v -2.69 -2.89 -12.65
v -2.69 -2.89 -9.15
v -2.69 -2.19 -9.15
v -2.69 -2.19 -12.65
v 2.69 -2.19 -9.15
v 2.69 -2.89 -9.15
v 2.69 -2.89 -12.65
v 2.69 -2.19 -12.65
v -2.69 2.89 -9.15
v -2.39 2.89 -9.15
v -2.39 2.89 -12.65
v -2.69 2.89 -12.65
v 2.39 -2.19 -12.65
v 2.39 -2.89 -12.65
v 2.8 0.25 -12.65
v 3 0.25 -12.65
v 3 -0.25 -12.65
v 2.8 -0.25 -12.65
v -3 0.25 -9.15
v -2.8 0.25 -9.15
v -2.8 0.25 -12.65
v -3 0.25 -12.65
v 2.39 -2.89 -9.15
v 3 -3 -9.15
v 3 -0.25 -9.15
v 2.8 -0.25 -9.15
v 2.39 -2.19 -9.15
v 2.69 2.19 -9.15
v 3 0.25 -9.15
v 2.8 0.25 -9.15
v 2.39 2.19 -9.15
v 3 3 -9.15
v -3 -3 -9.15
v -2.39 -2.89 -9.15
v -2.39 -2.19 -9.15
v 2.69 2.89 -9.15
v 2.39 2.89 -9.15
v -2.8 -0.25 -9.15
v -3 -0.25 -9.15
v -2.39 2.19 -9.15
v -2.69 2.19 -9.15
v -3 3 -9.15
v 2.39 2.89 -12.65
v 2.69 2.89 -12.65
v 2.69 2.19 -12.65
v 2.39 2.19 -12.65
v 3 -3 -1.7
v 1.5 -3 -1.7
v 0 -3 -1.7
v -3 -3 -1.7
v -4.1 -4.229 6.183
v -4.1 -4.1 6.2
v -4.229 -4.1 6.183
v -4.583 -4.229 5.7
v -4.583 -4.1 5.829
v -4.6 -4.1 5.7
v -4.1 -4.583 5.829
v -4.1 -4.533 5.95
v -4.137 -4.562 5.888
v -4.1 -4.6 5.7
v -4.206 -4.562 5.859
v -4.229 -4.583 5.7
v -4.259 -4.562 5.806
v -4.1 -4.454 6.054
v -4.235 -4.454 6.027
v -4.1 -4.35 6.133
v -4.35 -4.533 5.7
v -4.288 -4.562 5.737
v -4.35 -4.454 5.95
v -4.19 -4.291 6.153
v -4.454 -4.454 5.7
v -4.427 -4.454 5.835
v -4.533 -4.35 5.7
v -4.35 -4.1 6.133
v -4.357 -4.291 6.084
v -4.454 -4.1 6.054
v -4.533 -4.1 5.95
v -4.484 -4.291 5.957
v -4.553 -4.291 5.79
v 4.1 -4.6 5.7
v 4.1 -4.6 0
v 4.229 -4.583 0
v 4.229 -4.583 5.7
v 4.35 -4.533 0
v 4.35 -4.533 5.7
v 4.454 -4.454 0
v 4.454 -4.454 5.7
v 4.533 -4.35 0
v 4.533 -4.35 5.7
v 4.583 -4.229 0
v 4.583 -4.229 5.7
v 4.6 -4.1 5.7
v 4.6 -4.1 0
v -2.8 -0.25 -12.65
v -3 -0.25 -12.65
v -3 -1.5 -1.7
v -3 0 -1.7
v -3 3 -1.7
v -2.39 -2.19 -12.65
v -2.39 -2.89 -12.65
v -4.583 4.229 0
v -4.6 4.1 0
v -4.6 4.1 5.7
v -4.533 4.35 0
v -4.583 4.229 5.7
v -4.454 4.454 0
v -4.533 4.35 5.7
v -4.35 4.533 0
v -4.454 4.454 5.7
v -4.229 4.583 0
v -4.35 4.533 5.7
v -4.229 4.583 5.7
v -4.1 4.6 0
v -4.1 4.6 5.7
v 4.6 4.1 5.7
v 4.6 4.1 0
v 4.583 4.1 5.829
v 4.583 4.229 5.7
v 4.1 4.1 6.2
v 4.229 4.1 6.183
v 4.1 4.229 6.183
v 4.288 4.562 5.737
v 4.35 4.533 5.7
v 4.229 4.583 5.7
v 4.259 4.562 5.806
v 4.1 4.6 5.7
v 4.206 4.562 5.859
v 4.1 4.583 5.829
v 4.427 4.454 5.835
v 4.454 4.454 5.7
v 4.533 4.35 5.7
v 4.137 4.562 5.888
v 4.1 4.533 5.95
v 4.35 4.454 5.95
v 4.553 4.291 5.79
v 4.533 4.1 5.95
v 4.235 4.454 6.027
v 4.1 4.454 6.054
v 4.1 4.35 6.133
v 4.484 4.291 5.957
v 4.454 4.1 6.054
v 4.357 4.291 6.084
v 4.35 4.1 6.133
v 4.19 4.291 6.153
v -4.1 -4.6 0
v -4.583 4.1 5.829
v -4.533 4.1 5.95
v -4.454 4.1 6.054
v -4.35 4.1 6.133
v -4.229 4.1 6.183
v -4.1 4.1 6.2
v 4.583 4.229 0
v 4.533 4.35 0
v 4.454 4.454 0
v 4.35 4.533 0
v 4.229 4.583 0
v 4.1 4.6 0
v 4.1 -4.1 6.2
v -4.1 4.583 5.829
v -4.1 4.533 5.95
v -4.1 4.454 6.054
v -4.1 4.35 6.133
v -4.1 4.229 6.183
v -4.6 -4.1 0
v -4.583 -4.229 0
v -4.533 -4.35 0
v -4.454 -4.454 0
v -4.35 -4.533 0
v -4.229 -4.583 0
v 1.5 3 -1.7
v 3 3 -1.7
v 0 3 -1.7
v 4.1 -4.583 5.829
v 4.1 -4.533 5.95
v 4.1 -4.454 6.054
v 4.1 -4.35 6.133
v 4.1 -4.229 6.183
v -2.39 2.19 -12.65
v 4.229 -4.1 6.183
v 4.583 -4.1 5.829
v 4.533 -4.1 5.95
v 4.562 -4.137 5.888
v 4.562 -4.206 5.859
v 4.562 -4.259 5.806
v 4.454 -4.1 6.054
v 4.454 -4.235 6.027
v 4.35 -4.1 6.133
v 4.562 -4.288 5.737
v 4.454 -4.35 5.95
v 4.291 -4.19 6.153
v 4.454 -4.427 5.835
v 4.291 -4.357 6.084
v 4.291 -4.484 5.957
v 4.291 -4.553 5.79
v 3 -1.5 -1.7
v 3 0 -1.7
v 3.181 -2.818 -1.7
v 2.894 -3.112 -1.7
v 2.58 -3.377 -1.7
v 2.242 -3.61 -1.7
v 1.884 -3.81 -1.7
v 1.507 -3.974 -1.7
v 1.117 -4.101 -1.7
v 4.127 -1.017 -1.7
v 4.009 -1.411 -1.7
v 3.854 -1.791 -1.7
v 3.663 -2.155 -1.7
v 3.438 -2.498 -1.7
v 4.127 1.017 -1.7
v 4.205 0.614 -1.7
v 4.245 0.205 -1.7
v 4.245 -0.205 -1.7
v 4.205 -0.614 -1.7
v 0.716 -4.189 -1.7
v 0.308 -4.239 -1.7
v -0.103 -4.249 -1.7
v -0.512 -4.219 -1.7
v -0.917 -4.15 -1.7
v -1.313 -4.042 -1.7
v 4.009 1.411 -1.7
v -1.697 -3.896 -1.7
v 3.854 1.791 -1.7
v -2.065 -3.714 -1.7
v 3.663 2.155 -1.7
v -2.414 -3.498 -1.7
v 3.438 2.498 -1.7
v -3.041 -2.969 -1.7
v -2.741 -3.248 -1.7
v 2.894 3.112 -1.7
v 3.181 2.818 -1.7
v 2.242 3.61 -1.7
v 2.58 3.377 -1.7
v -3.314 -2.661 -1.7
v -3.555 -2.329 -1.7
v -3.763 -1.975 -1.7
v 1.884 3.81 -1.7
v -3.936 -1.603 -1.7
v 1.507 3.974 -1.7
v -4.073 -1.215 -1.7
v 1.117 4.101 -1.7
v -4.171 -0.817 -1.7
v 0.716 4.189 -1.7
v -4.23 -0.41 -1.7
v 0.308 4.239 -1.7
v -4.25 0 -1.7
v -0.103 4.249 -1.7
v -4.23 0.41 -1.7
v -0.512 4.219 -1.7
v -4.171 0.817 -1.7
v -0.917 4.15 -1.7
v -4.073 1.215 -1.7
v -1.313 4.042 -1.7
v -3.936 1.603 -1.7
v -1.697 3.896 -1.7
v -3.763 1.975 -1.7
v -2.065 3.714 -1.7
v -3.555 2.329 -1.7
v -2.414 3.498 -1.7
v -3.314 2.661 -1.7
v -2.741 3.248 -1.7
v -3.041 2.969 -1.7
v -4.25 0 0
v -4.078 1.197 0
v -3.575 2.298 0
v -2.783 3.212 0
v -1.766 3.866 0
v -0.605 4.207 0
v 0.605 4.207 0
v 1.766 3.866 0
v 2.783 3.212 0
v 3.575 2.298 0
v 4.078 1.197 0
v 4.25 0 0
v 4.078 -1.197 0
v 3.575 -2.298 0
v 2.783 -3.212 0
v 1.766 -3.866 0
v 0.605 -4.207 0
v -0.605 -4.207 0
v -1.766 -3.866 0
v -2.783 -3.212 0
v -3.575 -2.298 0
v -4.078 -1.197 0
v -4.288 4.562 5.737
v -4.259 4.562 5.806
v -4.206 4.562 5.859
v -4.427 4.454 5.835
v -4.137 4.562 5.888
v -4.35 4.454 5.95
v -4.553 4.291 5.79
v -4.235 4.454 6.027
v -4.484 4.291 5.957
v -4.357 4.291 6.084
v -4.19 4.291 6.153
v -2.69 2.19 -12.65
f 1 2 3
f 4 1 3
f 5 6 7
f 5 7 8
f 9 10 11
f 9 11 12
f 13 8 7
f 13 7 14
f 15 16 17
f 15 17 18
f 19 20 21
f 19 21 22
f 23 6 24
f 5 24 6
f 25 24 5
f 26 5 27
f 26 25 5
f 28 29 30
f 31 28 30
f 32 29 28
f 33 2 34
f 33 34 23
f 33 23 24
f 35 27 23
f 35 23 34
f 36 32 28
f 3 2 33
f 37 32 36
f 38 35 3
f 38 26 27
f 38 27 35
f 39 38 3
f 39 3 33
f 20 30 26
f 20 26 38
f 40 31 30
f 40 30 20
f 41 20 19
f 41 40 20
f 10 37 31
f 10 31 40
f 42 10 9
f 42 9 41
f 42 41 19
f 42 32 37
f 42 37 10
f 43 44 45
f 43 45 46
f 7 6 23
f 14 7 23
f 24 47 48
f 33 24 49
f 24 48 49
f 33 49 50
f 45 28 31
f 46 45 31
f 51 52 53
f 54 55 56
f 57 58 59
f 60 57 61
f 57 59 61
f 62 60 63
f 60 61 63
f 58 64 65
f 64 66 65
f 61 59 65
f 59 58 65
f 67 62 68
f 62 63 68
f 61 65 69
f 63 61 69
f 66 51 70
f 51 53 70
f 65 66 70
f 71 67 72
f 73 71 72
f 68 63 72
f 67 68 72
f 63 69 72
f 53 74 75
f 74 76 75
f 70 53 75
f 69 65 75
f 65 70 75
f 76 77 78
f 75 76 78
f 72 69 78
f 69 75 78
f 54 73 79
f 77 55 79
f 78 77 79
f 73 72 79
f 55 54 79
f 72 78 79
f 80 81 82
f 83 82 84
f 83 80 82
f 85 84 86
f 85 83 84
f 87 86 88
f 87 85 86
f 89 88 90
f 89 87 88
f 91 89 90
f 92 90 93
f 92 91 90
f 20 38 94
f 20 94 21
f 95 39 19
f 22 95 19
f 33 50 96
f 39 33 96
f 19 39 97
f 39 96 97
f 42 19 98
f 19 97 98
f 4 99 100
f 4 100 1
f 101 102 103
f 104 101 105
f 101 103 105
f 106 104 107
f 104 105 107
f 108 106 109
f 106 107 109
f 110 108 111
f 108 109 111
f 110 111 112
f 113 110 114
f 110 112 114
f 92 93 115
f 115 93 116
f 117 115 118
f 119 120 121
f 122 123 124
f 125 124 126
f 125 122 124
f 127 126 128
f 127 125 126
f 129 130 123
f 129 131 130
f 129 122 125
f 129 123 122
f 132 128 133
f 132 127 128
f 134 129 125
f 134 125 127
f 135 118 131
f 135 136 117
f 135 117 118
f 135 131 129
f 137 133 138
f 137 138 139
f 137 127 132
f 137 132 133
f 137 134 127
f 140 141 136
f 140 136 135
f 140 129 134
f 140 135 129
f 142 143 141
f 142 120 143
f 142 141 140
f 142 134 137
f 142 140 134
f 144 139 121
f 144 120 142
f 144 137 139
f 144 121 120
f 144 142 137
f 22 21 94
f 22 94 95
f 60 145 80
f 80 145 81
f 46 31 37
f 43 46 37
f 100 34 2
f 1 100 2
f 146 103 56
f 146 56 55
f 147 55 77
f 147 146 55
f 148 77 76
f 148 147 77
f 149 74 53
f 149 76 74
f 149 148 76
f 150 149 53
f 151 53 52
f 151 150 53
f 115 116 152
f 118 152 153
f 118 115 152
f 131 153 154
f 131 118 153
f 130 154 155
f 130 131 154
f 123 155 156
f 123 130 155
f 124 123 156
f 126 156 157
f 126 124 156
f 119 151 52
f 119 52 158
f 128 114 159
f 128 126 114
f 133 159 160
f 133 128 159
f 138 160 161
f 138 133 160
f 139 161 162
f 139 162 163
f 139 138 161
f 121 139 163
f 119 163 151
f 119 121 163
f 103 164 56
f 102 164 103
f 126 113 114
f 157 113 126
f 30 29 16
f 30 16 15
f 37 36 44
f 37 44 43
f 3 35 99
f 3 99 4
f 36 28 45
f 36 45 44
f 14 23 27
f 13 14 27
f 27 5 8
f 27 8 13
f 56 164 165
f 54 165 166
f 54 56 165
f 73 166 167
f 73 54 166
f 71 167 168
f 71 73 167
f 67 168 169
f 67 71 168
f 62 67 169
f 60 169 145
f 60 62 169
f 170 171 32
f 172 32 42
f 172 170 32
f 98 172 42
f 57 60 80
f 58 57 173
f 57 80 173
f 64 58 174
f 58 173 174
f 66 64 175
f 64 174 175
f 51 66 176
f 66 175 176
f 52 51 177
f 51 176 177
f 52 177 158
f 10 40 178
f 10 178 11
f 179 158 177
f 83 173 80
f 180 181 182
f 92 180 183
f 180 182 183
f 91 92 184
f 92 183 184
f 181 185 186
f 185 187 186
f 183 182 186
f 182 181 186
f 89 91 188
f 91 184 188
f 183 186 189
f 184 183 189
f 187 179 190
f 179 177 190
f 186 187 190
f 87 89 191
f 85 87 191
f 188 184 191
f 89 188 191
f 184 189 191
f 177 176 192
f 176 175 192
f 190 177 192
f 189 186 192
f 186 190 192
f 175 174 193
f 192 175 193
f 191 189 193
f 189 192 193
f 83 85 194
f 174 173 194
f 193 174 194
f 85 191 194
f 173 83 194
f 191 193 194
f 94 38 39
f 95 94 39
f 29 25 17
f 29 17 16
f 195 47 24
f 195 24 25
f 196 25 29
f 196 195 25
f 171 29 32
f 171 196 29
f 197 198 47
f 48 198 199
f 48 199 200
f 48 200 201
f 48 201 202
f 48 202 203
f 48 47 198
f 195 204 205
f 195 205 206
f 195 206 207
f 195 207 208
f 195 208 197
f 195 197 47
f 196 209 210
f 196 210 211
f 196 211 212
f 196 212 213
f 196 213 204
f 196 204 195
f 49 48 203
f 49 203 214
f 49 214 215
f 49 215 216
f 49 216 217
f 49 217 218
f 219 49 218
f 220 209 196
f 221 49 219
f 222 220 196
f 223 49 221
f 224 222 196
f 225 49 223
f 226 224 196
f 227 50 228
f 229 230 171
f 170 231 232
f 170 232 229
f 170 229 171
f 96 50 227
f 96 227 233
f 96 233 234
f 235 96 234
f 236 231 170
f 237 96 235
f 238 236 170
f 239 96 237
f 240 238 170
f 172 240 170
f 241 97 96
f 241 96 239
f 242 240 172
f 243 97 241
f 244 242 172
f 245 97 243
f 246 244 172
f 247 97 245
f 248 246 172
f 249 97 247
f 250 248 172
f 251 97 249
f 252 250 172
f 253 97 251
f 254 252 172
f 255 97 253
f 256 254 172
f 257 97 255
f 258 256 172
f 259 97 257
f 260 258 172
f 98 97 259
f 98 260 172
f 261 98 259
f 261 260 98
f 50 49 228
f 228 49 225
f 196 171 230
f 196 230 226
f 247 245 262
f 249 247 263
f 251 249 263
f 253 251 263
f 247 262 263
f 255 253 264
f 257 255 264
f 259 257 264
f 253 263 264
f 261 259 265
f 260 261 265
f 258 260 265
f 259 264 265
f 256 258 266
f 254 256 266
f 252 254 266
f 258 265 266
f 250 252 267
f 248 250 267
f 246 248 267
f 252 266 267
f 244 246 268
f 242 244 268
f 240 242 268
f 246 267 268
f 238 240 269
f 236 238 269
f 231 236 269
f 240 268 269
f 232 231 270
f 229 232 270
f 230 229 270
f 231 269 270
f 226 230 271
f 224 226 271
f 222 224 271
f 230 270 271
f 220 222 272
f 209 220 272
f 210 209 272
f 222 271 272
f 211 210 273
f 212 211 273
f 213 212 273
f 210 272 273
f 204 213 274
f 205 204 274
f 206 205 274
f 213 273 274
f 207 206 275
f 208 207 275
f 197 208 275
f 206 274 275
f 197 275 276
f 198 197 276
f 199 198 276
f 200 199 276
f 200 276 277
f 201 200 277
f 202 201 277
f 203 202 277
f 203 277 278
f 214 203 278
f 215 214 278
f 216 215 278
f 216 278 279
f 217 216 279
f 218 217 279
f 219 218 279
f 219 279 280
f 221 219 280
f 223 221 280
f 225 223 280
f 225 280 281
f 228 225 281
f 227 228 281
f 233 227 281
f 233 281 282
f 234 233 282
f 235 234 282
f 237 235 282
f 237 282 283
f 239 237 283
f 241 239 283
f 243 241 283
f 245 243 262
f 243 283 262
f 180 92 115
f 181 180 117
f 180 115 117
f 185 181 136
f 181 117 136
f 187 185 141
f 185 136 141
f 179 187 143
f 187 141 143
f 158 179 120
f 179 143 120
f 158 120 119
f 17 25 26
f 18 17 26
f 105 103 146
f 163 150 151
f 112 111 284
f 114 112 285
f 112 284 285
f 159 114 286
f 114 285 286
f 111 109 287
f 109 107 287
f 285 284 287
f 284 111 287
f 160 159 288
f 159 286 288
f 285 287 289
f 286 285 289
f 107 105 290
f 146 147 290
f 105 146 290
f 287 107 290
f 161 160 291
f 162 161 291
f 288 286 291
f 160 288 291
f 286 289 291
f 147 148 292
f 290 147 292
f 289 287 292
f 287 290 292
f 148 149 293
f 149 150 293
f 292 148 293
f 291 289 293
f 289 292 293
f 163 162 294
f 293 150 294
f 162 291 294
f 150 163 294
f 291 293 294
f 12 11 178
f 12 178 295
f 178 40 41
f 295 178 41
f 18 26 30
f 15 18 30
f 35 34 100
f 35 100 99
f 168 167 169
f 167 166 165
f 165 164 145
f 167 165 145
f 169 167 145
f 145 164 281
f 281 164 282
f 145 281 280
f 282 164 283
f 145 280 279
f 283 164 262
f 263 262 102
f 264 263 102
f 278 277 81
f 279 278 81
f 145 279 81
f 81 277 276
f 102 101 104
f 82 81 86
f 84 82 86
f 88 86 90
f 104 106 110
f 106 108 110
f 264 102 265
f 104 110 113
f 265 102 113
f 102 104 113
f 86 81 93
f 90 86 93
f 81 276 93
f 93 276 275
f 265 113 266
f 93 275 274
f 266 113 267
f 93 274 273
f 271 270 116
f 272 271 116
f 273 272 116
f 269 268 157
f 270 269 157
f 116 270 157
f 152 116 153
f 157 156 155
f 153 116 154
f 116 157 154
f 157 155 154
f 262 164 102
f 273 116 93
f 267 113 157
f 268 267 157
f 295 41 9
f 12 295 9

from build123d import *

# Parameters (mm, degrees)
SKETCH_1_W      = 9.2
SKETCH_1_H      = 9.2
EXTRUDE_1_DEPTH = 6.2
FILLET_1_R      = 0.5
SKETCH_2_R      = 4.25
EXTRUDE_2_DEPTH = 1.7
SKETCH_3_W      = 6
SKETCH_3_H      = 6
EXTRUDE_3_DEPTH = 7.45
SKETCH_4_W      = 0.3
SKETCH_4_H      = 0.7
SKETCH_4_W_2    = 0.2
SKETCH_4_H_2    = 0.5
EXTRUDE_4_DEPTH = 3.5


with BuildPart() as part:
    # Эскиз1 → Бобышка-Вытянуть1 (new body)
    with BuildSketch(Plane.XY):
        Rectangle(SKETCH_1_W, SKETCH_1_H)
    extrude(amount=EXTRUDE_1_DEPTH)

    # Скругление1
    fillet_1_edges = [part.edges().sort_by_distance(p)[0] for p in [
        (-4.6, 0, 6.2),
        (0, -4.6, 6.2),
        (4.6, 0, 6.2),
        (4.6, -4.6, 3.1),
        (-4.6, -4.6, 3.1),
        (-4.6, 4.6, 3.1),
        (4.6, 4.6, 3.1),
        (0, 4.6, 6.2),
    ]]
    fillet(fillet_1_edges, radius=FILLET_1_R)

    # Эскиз2 → Бобышка-Вытянуть2 (add)
    with BuildSketch(Plane(origin=(0, 0, 0), x_dir=(-1, 0, 0), z_dir=(0, 0, -1))):
        Circle(SKETCH_2_R)
    extrude(amount=EXTRUDE_2_DEPTH)

    # Эскиз3 → Бобышка-Вытянуть3 (add)
    with BuildSketch(Plane(origin=(0, 0, -1.7), x_dir=(-1, 0, 0), z_dir=(0, 0, -1))):
        Rectangle(SKETCH_3_W, SKETCH_3_H)
    extrude(amount=EXTRUDE_3_DEPTH)

    # Эскиз4 → Бобышка-Вытянуть4 (add)
    with BuildSketch(Plane(origin=(0, 0, -9.15), x_dir=(-1, 0, 0), z_dir=(0, 0, -1))):
        with Locations((-2.54, 2.54)):
            Rectangle(SKETCH_4_W, SKETCH_4_H)
        with Locations((2.54, 2.54)):
            Rectangle(SKETCH_4_W, SKETCH_4_H)
        with Locations((2.54, -2.54)):
            Rectangle(SKETCH_4_W, SKETCH_4_H)
        with Locations((-2.54, -2.54)):
            Rectangle(SKETCH_4_W, SKETCH_4_H)
        with Locations((2.9, 0)):
            Rectangle(SKETCH_4_W_2, SKETCH_4_H_2)
        with Locations((-2.9, 0)):
            Rectangle(SKETCH_4_W_2, SKETCH_4_H_2)
    extrude(amount=EXTRUDE_4_DEPTH)


solid = part.part
